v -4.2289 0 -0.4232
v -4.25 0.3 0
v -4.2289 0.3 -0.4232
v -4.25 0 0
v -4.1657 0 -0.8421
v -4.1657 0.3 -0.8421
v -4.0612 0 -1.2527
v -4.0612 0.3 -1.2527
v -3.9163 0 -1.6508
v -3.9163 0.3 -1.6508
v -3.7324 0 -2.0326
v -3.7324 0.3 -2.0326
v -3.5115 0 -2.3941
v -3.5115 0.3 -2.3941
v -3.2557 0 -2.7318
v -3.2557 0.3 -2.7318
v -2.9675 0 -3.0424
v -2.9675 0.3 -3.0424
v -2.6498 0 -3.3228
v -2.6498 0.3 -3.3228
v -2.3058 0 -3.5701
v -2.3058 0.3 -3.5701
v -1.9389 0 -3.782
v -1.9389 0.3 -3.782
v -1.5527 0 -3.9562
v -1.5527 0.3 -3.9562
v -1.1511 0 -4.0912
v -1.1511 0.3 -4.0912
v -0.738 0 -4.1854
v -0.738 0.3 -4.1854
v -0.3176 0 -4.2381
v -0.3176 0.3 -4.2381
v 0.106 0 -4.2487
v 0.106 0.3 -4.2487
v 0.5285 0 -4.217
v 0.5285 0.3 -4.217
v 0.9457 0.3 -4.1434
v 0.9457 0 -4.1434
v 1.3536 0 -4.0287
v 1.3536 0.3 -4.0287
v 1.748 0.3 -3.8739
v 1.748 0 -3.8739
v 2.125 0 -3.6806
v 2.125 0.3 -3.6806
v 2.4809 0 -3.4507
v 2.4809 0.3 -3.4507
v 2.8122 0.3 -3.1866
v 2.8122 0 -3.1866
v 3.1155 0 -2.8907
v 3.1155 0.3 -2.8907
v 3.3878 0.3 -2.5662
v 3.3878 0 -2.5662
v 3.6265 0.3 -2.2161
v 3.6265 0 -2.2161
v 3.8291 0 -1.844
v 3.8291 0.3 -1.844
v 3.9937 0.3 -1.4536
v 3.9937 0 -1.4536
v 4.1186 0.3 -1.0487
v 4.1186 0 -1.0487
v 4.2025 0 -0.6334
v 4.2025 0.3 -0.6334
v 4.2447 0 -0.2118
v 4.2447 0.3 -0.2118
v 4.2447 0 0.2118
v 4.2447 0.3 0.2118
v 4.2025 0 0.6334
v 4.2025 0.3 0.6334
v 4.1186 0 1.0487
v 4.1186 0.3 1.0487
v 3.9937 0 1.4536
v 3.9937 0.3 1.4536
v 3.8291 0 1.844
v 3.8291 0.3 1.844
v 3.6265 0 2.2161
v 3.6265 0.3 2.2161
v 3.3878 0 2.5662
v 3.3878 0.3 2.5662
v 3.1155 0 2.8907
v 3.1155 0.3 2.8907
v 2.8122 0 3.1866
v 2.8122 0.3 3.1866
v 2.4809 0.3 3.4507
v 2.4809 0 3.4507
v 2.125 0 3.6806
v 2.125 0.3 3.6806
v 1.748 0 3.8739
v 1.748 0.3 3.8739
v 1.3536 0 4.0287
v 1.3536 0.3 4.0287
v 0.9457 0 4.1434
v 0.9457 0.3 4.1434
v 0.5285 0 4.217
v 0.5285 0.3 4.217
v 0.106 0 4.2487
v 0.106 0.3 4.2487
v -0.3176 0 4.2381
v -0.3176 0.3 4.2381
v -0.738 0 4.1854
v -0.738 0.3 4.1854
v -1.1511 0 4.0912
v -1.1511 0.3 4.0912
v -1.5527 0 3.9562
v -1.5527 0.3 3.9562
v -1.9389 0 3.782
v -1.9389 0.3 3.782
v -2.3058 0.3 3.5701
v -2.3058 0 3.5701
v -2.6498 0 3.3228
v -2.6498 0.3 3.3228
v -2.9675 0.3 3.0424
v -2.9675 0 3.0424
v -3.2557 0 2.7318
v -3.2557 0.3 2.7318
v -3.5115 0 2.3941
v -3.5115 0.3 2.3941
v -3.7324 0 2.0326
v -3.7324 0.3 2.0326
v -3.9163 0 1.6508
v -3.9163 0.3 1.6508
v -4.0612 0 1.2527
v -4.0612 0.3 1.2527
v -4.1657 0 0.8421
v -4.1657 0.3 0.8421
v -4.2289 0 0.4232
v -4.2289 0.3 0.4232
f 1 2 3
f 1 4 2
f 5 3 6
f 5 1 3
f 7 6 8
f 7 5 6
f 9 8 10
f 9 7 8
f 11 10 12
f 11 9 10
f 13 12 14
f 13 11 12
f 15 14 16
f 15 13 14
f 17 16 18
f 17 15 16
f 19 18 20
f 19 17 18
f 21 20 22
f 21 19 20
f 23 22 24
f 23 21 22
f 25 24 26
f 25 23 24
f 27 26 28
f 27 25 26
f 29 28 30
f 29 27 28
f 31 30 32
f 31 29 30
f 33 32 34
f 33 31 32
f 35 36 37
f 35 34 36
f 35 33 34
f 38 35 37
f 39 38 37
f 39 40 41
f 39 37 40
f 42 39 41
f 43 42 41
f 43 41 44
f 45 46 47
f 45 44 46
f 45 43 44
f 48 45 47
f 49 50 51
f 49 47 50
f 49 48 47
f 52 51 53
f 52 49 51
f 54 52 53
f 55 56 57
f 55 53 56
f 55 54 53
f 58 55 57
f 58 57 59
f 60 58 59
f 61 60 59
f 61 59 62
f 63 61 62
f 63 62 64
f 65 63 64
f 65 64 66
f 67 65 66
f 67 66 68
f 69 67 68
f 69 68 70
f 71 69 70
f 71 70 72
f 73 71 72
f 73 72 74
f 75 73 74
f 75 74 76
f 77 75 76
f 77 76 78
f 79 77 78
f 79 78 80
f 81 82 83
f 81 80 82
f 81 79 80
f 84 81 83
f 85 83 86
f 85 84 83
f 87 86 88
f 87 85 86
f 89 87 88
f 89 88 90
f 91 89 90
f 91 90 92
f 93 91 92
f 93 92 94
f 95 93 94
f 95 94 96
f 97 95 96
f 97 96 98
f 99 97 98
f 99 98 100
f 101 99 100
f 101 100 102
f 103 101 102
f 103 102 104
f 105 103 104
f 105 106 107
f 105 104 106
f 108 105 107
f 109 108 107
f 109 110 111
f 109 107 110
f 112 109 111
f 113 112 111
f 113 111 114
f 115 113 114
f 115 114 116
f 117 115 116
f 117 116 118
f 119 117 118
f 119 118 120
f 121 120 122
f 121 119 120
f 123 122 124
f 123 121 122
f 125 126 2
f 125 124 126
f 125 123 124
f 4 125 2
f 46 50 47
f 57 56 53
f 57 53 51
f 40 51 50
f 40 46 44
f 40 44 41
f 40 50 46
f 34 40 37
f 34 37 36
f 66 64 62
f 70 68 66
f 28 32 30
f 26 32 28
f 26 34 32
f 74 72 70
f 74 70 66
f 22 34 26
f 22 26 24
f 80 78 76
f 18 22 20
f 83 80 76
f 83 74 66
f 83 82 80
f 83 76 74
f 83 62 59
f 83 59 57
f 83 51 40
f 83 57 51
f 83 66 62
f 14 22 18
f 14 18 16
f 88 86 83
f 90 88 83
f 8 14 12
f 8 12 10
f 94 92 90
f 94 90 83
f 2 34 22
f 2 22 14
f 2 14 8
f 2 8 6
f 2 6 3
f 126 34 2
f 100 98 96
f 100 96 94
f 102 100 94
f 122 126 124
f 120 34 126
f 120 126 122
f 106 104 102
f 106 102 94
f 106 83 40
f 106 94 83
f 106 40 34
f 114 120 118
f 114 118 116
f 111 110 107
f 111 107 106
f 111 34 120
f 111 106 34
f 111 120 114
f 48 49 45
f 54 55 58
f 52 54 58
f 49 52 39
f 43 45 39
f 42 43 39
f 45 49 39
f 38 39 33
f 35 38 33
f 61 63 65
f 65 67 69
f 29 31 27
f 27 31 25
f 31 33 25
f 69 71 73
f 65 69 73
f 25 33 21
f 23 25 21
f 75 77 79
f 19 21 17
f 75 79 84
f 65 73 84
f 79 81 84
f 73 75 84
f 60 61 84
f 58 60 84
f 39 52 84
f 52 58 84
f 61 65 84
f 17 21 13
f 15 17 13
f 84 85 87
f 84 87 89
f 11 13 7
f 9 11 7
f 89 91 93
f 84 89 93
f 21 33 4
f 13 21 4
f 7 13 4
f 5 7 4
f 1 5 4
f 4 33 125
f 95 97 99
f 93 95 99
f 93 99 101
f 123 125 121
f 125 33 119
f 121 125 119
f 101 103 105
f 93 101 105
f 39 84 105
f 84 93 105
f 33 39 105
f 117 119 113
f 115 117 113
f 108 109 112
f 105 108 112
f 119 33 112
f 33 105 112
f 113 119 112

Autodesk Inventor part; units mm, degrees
ref_plane "YZ Plane" through (0, 0, 0) normal (1, 0, 0) x (0, 1, 0)
ref_plane "XZ Plane" through (0, 0, 0) normal (0, 1, 0) x (-1, 0, 0)
ref_plane "XY Plane" through (0, 0, 0) normal (0, 0, 1) x (1, 0, 0)
sketch "Sketch1" plane through (0, 0, 0) normal (0, 1, 0) x (-1, 0, 0)
  circle A0 centre (0, 0) radius 4.25
  dimension "d0" = 8.5
extrude "Extrusion1" add sketch "Sketch1" along normal blind 0.3
sketch "Sketch2" plane through (0, 0.3, 0) normal (0, 1, 0) x (1, 0, 0)
  line L0 (-0.5, 0.5) -> (0.5, 0.5)
  line L1 (0.5, -1.5) -> (0.5, -4.25)
  line L2 (0.5, -4.25) -> (-0.5, -4.25)
  line L3 (-0.5, -4.25) -> (-0.5, -1.5)
  line L4 (-0.5, 0.5) -> (-2.7165, -3.3391)
  line L5 (-2.7165, -3.3391) -> (-1.8505, -3.8391)
  line L6 (-1.8505, -3.8391) -> (-0.5, -1.5)
  line L7 (0.5, -1.5) -> (1.8505, -3.8391)
  line L8 (1.8505, -3.8391) -> (2.7165, -3.3391)
  line L9 (2.7165, -3.3391) -> (0.5, 0.5)
  line L10 (0, 5.95) -> (0, -5.95) construction
  circle A0 centre (0, 0) radius 4.25 construction
  dimension "d3" = 60
  dimension "d4" = 1
  dimension "d5" = 0.5
split_face "Split1"
sketch "Sketch3" plane through (-0.5, 0.3, -0.5) normal (0, 1, 0) x (1, 0, 0)
  line L0 (0, 1) -> (1, 1)
  line L1 (1, 1) -> (1, 3.75)
  line L2 (1, 3.75) -> (0, 3.75)
  line L3 (0, 3.75) -> (0, 1)
  line L4 (0, -4.7205) -> (0, -2) projected
  line L5 (1, -2) -> (1, -4.7205) projected
  arc A0 (3.1889, -3.7913) -> (-3.75, -0.5) centre (0.5, -0.5) ccw construction
  line L6 (0, 0) -> (1, 0) projected
  dimension "d6" = 1
split_face "Split2"
properties part number "Manfrotto Logo 01 - 1"
